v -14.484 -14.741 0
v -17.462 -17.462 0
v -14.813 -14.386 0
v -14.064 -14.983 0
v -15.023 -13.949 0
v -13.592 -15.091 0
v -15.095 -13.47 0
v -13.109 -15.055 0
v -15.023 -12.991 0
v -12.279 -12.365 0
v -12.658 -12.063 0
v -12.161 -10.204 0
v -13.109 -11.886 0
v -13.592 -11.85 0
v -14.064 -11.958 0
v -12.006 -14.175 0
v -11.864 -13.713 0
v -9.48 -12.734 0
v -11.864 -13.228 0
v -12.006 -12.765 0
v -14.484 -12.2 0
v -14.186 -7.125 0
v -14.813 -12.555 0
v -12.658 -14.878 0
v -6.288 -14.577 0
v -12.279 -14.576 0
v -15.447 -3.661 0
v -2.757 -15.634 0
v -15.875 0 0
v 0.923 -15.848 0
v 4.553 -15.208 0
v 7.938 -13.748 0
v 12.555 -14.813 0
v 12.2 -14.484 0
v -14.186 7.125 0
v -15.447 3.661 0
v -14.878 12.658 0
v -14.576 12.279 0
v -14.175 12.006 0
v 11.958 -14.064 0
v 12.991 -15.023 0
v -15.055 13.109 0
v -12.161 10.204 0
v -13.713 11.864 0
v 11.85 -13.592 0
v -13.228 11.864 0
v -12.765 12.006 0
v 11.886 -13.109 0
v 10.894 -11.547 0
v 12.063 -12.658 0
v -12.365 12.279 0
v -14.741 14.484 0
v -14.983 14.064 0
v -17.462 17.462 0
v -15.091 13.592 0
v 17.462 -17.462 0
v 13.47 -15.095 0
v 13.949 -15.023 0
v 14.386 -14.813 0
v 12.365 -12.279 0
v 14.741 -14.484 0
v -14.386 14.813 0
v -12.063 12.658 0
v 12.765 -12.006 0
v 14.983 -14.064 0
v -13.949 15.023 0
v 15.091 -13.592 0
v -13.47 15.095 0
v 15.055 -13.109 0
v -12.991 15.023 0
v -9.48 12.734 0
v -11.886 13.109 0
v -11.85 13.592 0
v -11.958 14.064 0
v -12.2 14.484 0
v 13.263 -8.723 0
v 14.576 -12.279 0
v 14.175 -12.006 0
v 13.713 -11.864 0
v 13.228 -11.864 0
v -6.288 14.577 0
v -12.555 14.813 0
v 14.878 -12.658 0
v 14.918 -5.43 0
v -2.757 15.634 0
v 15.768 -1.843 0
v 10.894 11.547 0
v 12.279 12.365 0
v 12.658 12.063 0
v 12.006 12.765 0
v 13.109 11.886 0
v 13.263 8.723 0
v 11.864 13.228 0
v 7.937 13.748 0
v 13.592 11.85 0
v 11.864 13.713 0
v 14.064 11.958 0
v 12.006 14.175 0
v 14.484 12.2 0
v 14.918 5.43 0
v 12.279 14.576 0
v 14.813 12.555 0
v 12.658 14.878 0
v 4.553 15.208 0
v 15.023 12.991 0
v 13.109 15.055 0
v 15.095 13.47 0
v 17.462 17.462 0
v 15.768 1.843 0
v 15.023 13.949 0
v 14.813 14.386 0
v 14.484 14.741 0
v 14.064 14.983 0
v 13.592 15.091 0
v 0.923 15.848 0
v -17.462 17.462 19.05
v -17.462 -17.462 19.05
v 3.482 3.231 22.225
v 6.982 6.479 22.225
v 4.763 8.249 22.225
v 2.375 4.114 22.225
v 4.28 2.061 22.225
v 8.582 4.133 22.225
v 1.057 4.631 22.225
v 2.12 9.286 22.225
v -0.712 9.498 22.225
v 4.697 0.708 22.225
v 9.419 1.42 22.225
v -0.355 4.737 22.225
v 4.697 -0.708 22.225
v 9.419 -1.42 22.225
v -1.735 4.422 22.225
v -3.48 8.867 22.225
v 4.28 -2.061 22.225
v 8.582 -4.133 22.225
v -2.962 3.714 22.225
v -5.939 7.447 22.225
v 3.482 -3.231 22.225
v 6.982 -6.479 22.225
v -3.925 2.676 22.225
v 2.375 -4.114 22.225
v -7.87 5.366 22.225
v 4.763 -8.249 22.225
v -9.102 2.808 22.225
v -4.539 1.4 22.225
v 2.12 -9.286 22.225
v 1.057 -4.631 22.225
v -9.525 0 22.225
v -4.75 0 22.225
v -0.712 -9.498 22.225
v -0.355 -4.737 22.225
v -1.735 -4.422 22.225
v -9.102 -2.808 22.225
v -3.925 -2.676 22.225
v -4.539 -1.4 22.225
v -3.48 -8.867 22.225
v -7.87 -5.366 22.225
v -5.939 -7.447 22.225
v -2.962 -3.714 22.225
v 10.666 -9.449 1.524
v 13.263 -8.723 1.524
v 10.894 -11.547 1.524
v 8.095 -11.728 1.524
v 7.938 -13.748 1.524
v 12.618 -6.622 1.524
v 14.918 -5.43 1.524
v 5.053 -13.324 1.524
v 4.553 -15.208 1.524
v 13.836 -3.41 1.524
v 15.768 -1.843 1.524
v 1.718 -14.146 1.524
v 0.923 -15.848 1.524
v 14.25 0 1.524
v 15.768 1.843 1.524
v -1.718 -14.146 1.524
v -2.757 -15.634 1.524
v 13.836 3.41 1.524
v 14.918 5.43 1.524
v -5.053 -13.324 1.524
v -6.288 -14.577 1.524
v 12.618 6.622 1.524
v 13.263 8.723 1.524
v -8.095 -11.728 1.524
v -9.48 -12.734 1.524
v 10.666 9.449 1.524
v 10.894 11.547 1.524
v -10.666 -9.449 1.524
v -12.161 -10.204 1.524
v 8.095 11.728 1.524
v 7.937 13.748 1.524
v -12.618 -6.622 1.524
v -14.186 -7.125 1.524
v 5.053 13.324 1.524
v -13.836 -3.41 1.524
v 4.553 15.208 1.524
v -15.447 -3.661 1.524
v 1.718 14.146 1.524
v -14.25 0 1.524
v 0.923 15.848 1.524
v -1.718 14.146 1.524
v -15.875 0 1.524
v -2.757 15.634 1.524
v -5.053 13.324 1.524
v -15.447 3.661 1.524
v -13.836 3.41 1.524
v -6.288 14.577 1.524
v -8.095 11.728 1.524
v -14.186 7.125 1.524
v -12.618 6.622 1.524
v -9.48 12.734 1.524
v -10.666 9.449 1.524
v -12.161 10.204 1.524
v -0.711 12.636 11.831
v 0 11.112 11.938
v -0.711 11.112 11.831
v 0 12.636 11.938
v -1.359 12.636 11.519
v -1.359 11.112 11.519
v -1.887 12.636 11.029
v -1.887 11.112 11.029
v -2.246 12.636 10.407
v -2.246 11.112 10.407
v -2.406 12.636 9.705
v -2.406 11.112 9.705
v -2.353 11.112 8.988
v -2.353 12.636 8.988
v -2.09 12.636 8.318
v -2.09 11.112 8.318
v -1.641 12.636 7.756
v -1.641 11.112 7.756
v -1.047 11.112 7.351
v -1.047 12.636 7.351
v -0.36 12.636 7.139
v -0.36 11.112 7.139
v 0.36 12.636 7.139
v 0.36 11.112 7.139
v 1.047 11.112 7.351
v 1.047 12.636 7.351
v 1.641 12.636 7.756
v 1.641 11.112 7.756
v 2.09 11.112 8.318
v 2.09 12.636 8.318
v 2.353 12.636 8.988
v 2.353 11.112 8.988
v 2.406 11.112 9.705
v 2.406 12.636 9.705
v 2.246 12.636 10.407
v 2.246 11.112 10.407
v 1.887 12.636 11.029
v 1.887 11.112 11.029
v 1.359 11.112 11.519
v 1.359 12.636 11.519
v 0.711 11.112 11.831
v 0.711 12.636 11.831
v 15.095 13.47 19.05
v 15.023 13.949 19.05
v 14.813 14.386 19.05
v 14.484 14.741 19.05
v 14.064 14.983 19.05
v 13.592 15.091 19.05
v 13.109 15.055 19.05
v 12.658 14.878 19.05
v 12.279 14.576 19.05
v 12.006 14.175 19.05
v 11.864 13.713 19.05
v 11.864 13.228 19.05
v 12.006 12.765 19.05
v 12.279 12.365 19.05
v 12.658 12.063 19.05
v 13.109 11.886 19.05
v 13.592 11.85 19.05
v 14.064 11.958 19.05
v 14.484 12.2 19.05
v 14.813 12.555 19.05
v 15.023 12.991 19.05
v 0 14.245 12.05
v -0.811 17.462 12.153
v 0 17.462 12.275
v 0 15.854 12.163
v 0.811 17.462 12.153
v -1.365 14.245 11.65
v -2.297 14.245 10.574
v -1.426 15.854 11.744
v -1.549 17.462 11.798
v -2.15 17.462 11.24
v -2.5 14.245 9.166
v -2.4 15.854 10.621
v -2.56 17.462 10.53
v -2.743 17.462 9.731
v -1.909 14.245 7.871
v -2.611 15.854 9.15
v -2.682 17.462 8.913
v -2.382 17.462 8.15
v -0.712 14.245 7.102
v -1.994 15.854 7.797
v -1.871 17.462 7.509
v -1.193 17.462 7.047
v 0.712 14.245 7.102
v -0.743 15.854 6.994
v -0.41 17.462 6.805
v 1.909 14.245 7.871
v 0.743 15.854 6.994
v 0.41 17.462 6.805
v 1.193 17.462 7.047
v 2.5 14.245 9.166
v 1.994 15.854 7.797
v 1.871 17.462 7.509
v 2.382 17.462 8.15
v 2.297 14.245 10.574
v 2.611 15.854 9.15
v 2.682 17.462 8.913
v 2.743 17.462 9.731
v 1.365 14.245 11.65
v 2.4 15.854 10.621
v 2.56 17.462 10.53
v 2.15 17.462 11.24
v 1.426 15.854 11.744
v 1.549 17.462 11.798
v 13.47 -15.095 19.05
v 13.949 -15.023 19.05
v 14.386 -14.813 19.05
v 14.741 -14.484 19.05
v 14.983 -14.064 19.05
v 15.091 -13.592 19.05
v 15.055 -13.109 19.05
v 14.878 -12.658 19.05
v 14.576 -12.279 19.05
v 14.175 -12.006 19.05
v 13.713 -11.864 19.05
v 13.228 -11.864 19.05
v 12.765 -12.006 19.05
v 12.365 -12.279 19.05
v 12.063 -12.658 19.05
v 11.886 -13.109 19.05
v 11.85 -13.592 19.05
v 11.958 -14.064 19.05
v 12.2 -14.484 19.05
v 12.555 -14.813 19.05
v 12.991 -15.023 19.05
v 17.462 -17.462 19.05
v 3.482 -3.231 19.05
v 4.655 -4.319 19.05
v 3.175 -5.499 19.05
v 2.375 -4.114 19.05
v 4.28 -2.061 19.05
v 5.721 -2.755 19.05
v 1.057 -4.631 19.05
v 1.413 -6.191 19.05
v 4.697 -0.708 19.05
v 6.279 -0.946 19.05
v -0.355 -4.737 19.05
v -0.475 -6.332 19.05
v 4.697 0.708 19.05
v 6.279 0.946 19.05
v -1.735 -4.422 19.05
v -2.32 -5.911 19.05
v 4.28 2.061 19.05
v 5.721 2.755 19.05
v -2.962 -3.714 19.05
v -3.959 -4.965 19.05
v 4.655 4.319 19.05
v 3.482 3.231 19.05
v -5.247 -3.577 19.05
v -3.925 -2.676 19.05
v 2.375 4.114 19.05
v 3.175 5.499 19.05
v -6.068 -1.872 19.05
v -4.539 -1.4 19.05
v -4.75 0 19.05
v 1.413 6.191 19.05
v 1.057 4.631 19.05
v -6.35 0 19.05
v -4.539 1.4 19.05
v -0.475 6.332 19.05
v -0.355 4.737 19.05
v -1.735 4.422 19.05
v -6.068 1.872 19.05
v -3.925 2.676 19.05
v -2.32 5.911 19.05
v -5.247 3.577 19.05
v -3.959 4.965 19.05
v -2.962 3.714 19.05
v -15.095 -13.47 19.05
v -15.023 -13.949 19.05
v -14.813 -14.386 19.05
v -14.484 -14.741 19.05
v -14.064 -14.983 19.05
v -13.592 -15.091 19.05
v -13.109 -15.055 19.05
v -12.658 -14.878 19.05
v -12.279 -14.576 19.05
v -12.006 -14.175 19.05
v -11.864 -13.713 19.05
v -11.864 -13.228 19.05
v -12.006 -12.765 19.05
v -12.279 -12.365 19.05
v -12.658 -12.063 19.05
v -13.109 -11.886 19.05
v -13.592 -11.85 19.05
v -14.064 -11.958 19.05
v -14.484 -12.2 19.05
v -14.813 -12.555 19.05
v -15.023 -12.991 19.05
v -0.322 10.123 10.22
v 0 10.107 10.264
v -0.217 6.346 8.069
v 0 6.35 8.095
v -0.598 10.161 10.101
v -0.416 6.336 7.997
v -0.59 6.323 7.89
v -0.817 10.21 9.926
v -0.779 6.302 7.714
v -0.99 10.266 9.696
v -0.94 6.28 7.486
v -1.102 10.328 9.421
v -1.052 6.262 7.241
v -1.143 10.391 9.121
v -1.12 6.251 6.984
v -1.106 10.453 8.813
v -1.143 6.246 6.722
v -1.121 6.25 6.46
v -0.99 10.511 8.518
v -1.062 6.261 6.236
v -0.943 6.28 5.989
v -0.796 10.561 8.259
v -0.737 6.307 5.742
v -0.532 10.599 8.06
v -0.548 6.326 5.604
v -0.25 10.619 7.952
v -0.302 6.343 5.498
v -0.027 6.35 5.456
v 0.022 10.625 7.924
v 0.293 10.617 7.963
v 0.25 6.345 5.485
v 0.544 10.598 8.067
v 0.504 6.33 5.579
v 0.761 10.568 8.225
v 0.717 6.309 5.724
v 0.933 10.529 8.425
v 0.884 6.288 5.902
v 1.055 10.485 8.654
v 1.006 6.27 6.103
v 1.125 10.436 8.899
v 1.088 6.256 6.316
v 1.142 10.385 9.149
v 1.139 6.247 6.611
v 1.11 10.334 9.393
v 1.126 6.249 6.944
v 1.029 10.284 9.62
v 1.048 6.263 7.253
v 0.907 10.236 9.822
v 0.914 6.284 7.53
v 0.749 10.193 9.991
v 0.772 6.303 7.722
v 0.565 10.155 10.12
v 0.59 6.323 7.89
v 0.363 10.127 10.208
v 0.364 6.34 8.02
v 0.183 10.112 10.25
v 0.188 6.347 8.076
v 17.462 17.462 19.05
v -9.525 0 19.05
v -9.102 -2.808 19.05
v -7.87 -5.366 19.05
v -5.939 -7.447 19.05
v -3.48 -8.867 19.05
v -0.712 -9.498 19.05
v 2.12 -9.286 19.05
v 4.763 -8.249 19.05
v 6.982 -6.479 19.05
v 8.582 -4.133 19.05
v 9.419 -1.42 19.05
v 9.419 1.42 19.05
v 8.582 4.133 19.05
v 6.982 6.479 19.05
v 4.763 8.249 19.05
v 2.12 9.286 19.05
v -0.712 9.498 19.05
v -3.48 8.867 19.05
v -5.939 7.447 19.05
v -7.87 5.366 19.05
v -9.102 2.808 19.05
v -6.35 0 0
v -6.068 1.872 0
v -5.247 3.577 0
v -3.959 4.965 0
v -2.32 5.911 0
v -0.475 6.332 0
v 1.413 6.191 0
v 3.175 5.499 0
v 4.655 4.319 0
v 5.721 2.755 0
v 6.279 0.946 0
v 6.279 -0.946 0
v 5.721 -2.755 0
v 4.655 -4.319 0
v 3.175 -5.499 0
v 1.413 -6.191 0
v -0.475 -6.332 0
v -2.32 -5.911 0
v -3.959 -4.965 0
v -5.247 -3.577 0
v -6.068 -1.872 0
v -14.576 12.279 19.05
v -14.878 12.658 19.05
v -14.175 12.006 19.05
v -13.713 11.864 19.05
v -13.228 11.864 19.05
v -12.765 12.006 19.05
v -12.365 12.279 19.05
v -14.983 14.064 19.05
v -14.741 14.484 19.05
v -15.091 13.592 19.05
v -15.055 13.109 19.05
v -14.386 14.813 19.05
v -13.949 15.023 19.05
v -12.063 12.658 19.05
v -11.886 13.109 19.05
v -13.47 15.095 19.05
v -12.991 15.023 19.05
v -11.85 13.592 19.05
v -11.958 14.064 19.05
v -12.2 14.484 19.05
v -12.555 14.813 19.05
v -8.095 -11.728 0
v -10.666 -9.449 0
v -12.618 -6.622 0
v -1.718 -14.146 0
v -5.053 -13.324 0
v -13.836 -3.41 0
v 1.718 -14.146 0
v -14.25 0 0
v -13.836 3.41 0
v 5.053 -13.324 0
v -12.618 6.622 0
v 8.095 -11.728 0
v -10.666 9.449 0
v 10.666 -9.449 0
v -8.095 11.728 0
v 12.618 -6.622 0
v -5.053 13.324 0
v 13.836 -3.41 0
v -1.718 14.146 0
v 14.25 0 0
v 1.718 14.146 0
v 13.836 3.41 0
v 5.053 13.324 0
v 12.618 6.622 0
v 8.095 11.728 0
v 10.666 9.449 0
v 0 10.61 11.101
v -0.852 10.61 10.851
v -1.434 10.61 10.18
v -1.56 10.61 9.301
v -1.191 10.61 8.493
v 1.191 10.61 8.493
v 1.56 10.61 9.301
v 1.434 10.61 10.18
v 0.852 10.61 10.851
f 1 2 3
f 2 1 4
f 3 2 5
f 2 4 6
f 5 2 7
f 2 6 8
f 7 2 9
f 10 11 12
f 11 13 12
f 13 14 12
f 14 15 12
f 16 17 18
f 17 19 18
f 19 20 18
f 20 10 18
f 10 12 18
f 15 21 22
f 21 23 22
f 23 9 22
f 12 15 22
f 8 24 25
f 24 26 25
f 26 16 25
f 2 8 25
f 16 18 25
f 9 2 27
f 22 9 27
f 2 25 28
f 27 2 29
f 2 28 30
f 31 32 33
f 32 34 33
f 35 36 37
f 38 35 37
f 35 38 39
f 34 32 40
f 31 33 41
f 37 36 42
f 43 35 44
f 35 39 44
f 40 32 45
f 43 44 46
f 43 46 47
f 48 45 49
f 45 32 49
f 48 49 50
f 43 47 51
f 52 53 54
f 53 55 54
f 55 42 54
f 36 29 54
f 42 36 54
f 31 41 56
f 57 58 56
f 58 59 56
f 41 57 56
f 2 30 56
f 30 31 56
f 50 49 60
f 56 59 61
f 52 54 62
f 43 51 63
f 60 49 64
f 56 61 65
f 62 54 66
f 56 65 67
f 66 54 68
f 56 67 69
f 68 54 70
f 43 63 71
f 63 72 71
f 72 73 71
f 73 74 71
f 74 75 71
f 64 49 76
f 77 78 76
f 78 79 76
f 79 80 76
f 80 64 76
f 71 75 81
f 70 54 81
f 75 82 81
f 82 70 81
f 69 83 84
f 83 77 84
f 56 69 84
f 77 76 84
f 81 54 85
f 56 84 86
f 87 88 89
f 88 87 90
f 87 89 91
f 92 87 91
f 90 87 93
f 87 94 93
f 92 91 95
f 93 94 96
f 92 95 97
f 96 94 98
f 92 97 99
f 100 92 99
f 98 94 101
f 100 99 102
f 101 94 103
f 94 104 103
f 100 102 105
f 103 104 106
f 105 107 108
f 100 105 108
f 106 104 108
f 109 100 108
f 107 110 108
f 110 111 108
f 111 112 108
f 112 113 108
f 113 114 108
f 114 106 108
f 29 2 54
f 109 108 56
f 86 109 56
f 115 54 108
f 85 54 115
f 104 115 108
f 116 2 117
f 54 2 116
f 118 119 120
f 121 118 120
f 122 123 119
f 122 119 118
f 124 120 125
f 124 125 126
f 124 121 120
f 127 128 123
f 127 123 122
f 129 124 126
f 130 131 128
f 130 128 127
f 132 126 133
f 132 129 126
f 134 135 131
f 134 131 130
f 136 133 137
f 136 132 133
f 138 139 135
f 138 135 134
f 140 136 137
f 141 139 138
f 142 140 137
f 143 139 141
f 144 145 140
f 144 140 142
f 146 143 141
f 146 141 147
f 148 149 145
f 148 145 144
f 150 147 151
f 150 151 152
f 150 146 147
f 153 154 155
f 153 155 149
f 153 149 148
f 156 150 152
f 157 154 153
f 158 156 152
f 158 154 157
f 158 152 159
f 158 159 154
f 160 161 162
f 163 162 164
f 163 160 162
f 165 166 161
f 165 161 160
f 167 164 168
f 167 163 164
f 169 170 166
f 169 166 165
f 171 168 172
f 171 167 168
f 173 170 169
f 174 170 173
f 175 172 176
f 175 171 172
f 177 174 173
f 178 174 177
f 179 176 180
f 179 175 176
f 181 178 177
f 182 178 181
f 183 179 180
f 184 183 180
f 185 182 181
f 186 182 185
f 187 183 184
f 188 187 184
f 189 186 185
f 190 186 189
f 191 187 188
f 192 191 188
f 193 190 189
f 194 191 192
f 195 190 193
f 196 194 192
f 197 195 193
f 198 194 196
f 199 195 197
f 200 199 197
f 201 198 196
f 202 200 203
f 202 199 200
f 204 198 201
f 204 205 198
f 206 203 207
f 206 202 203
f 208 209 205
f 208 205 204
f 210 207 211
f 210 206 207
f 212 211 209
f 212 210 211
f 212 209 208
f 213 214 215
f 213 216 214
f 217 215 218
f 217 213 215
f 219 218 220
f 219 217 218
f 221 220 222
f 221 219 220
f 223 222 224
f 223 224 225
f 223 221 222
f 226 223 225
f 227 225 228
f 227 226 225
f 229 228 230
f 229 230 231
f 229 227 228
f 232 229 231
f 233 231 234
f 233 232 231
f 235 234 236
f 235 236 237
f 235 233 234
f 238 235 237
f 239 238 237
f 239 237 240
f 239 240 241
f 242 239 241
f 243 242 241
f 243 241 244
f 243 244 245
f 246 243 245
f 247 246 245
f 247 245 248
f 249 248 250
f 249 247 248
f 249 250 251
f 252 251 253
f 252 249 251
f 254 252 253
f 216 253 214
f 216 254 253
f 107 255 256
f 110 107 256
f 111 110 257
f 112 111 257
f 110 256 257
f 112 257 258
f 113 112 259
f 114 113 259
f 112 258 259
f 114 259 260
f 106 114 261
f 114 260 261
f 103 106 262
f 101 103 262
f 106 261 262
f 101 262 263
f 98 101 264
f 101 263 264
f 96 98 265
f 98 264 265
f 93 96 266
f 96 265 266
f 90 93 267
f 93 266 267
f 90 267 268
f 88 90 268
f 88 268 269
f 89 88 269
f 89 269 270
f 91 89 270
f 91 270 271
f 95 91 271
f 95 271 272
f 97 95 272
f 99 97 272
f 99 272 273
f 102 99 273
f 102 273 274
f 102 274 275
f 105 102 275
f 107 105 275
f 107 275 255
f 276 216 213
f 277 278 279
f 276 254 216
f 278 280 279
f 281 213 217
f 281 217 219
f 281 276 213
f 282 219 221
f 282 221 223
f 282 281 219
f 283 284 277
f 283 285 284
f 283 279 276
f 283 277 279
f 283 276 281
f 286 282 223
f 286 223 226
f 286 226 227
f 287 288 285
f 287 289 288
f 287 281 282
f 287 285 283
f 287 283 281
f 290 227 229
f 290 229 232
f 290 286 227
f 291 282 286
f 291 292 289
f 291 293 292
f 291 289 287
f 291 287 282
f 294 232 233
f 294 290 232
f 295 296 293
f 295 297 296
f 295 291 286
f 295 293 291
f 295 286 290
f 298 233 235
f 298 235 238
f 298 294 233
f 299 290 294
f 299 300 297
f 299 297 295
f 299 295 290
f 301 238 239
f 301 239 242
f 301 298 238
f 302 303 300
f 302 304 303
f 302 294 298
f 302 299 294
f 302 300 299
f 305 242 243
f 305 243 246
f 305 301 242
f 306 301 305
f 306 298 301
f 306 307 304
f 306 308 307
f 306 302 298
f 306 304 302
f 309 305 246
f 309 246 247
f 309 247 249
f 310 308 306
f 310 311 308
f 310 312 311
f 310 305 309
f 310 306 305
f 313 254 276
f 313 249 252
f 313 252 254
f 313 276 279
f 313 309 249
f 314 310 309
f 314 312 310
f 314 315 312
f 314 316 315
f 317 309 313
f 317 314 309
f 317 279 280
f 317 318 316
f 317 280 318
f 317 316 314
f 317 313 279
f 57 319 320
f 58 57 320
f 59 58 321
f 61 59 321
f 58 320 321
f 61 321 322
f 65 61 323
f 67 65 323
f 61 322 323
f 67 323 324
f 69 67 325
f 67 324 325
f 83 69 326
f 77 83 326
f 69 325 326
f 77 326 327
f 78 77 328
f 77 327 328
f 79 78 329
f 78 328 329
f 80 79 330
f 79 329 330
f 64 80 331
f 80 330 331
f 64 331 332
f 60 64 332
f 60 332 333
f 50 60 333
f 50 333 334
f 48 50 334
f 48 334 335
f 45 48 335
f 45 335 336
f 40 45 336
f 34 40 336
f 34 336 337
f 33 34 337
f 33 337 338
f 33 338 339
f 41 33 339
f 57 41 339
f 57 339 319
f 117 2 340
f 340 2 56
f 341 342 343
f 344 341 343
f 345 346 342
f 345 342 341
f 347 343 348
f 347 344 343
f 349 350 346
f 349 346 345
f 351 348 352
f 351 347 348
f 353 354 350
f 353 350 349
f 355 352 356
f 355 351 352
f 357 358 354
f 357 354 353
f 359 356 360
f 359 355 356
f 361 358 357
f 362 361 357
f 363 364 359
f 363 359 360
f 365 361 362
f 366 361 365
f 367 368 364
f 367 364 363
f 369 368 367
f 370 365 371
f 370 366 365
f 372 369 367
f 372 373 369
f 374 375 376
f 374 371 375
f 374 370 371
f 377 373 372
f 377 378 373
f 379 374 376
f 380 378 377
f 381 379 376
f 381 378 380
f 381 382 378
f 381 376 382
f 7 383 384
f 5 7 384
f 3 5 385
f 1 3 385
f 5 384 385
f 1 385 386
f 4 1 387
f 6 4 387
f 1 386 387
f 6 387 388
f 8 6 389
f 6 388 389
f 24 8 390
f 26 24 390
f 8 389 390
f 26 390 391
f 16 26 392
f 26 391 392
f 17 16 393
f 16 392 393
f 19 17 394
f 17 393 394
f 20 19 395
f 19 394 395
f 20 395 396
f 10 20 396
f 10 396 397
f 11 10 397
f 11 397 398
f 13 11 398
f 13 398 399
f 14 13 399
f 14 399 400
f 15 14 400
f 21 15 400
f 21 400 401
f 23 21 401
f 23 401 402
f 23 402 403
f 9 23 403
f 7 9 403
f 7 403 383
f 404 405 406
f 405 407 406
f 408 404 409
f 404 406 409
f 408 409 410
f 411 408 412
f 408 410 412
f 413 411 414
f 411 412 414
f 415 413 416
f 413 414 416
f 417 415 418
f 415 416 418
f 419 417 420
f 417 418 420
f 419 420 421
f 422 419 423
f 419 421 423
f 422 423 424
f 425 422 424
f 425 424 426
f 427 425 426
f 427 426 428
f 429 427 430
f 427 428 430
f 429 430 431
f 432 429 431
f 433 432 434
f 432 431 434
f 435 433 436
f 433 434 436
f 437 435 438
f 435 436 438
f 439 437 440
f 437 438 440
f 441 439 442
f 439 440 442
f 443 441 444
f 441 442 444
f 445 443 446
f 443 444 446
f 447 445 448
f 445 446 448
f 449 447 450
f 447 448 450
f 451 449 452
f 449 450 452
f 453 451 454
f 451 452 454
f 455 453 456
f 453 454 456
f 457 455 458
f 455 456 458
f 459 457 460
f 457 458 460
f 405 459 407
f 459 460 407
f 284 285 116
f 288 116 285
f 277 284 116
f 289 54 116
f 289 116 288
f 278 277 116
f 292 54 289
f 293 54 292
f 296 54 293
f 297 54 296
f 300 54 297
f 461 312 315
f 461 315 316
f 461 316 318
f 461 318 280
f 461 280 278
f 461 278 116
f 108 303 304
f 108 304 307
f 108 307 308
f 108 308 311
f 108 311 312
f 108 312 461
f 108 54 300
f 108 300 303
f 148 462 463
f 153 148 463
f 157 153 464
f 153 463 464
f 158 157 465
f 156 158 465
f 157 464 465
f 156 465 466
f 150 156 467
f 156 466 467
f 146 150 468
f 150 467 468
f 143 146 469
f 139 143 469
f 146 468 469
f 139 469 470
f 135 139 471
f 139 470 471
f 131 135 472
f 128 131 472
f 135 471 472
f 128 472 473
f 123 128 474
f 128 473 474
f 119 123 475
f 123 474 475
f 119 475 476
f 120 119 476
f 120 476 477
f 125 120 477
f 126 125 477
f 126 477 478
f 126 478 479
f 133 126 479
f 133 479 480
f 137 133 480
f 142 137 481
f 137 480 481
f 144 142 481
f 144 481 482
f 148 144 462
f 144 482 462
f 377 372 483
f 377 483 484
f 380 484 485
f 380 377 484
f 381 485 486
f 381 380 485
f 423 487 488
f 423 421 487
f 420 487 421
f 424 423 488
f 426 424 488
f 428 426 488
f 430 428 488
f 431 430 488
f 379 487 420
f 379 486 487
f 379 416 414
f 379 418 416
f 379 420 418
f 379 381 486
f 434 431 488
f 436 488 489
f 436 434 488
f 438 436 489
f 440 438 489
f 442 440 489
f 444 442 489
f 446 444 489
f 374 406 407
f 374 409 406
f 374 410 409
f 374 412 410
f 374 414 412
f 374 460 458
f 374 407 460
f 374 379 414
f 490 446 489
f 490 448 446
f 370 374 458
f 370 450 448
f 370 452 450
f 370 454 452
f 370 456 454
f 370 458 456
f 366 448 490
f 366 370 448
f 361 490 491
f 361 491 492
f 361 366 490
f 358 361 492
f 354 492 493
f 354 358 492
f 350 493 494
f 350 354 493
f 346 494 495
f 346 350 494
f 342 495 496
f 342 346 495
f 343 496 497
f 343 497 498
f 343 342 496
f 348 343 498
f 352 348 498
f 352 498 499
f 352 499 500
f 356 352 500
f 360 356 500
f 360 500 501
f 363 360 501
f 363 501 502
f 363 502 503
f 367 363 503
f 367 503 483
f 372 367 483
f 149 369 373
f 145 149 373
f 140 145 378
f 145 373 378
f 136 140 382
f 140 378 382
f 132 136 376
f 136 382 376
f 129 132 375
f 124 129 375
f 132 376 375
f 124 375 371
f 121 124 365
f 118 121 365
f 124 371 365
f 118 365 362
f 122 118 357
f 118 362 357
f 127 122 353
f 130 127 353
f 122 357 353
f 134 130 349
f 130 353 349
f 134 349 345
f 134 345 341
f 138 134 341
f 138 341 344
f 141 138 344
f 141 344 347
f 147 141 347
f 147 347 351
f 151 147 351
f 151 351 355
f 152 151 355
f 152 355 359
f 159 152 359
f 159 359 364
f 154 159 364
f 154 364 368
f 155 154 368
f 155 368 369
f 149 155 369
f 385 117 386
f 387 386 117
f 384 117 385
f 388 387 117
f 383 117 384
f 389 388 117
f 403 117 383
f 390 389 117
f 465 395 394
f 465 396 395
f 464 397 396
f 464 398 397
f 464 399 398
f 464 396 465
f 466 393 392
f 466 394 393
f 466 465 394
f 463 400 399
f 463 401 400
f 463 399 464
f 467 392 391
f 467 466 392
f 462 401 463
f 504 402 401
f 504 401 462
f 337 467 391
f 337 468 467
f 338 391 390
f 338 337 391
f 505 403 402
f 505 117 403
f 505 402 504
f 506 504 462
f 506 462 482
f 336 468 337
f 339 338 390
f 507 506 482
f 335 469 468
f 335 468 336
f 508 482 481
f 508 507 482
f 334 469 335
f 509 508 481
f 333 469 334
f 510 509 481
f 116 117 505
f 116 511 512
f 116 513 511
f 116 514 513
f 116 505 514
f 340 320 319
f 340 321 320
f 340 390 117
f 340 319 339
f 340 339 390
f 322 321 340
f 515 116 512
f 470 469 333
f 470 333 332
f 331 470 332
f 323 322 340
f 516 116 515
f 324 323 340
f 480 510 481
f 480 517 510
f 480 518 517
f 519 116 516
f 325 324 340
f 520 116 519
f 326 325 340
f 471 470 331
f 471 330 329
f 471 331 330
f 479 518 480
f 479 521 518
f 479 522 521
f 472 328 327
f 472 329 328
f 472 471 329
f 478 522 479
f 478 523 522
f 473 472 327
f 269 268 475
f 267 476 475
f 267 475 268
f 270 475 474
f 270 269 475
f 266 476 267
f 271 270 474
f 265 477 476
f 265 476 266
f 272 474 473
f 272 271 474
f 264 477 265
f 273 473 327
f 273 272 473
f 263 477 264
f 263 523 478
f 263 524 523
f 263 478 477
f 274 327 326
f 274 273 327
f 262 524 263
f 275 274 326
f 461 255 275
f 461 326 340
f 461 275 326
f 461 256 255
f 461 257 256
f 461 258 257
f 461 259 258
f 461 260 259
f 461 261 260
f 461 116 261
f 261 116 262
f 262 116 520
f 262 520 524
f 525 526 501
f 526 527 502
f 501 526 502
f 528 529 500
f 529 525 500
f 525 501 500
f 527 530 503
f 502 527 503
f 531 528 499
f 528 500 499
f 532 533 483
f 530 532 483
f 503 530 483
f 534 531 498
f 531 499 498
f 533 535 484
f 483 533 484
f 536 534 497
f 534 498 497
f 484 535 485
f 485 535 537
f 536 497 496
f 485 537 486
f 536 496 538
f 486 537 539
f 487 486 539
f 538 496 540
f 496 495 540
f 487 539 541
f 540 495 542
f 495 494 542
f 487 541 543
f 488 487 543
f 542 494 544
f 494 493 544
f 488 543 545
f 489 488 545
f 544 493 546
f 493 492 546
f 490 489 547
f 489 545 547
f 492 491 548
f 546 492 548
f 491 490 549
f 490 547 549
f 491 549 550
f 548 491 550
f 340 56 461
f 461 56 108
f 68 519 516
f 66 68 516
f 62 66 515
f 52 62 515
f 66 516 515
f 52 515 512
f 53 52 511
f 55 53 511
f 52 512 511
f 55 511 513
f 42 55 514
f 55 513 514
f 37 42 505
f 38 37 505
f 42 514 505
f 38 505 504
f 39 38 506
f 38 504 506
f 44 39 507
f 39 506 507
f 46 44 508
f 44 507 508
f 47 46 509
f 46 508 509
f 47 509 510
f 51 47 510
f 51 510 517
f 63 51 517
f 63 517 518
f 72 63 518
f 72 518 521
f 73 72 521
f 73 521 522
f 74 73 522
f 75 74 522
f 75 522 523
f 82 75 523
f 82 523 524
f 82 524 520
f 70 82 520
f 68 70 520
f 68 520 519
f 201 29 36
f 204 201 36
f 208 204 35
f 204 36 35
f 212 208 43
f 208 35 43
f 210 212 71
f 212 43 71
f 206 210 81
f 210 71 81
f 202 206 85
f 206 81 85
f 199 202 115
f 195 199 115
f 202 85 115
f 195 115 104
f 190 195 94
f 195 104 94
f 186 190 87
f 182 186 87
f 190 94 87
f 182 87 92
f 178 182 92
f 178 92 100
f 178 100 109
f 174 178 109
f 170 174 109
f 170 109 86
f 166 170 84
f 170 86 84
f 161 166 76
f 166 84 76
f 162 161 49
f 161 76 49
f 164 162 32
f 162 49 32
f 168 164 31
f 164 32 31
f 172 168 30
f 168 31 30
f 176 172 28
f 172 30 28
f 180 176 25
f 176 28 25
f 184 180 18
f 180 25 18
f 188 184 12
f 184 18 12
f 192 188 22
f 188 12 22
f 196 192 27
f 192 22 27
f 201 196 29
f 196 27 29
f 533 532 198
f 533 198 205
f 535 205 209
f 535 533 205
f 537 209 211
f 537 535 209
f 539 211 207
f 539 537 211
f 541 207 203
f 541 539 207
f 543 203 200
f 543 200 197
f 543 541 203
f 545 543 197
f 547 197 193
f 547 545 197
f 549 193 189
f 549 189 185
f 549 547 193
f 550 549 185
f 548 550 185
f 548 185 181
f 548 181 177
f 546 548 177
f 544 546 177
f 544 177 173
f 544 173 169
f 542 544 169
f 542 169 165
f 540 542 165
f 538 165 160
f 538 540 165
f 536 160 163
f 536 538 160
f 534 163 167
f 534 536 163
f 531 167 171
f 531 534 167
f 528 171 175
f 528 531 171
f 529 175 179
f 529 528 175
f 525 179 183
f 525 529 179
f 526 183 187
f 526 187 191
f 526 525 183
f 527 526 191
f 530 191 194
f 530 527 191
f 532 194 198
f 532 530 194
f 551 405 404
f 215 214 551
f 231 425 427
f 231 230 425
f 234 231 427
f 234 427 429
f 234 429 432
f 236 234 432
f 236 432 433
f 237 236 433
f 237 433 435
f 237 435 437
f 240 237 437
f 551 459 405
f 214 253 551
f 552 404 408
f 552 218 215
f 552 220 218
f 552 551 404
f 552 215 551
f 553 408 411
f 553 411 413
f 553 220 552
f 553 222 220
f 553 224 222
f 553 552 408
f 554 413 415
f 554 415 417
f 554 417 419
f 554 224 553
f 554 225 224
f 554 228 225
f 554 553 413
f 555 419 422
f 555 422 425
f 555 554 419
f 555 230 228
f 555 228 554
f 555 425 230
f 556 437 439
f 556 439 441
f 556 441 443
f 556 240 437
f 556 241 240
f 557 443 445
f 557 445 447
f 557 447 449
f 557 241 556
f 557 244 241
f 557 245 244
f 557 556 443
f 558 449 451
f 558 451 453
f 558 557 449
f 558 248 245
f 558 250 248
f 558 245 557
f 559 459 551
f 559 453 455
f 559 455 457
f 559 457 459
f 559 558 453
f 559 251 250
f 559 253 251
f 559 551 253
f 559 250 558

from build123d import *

# Parameters (mm, degrees)
SKETCH1_W           = 34.925
SKETCH1_H           = 34.925
BASE_EXTRUDE_DEPTH  = 19.05
SKETCH12_R          = 15.875
SKETCH12_R_2        = 14.25
CUT_EXTRUDE4_DEPTH  = 1.524
SKETCH3_R           = 1.625
CUT_EXTRUDE2_DEPTH  = 32.189426293
CIRPATTERN2_COUNT   = 4
SKETCH15_R          = 9.525
BOSS_EXTRUDE1_DEPTH = 3.175
SKETCH14_R          = 4.75
CUT_EXTRUDE6_DEPTH  = 34.223913639
CUT_EXTRUDE7_START  = -19.05
SKETCH16_R          = 6.35
CUT_EXTRUDE7_DEPTH  = 19.05


with BuildPart() as part:
    # Sketch1 → Base-Extrude (new body)
    with BuildSketch(Plane.XY):
        Rectangle(SKETCH1_W, SKETCH1_H)
    extrude(amount=BASE_EXTRUDE_DEPTH)

    # Sketch12 → Cut-Extrude4 (cut)
    with BuildSketch(Plane(origin=(-5.978518985, 12.821273311, 0), x_dir=(-1, 0, 0), z_dir=(0, 0, -1))):
        with Locations((-5.978518985, -12.821273311)):
            Circle(SKETCH12_R)
        with Locations((-5.978518985, -12.821273311)):
            Circle(SKETCH12_R_2, mode=Mode.SUBTRACT)
    extrude(amount=-CUT_EXTRUDE4_DEPTH, mode=Mode.SUBTRACT)

    # Sketch3 → Cut-Extrude2 (cut, through all)
    with BuildSketch(Plane.XY.offset(19.05)):
        with Locations((13.470384182, 13.470384182)):
            Circle(SKETCH3_R)
    cut_extrude2 = extrude(amount=-CUT_EXTRUDE2_DEPTH, mode=Mode.SUBTRACT)

    # CirPattern2: Cut-Extrude2 ×4 about axis
    cirpattern2_axis = Axis((0, 0, 0), (0, 0, 1))
    for i in range(1, CIRPATTERN2_COUNT):
        add(cut_extrude2.rotate(cirpattern2_axis, i * 360 / CIRPATTERN2_COUNT), mode=Mode.SUBTRACT)

    # Sketch10 → Hole3 (revolve, cut)
    with BuildSketch(Plane(origin=(0, 17.4625, 9.525), x_dir=(0, 0, 1), z_dir=(1, 0, 0))):
        Polygon((0, 0), (0, 7.799876674), (2.413, 6.35), (2.413, 4.826), (2.750466794, 0), align=None)
    revolve(axis=Axis((0, 21.469039452, 9.525), (0, -1, 0)), mode=Mode.SUBTRACT)

    # Sketch15 → Boss-Extrude1 (add)
    with BuildSketch(Plane.XY.offset(19.05)):
        with Locations(Location((0, 0, 0), (0, 0, 180))):
            Circle(SKETCH15_R)
    extrude(amount=BOSS_EXTRUDE1_DEPTH)

    # Sketch14 → Cut-Extrude6 (cut, through all)
    with BuildSketch(Plane(origin=(0, 0, 0), x_dir=(-1, 0, 0), z_dir=(0, 0, -1))):
        Circle(SKETCH14_R)
    extrude(amount=-CUT_EXTRUDE6_DEPTH, mode=Mode.SUBTRACT)

    # Sketch16 → Cut-Extrude7 (cut)
    with BuildSketch(Plane(origin=(0, 0, 0), x_dir=(-1, 0, 0), z_dir=(0, 0, -1)).offset(CUT_EXTRUDE7_START)):
        Circle(SKETCH16_R)
    extrude(amount=CUT_EXTRUDE7_DEPTH, mode=Mode.SUBTRACT)

    # Sketch17 → Cut-Revolve1 (revolve, cut)
    with BuildSketch(Plane(origin=(0, 0, 0), x_dir=(0, 0, -1), z_dir=(1, 0, 0))):
        Polygon((-9.525, 11.1125), (-10.514867037, 10.541), (-4.09906217, -0.5715), (-3.109195134, 0), align=None)
    revolve(axis=Axis((0, 11.1125, 9.525), (0, -0.8660254037844396, -0.4999999999999983)), mode=Mode.SUBTRACT)


solid = part.part
